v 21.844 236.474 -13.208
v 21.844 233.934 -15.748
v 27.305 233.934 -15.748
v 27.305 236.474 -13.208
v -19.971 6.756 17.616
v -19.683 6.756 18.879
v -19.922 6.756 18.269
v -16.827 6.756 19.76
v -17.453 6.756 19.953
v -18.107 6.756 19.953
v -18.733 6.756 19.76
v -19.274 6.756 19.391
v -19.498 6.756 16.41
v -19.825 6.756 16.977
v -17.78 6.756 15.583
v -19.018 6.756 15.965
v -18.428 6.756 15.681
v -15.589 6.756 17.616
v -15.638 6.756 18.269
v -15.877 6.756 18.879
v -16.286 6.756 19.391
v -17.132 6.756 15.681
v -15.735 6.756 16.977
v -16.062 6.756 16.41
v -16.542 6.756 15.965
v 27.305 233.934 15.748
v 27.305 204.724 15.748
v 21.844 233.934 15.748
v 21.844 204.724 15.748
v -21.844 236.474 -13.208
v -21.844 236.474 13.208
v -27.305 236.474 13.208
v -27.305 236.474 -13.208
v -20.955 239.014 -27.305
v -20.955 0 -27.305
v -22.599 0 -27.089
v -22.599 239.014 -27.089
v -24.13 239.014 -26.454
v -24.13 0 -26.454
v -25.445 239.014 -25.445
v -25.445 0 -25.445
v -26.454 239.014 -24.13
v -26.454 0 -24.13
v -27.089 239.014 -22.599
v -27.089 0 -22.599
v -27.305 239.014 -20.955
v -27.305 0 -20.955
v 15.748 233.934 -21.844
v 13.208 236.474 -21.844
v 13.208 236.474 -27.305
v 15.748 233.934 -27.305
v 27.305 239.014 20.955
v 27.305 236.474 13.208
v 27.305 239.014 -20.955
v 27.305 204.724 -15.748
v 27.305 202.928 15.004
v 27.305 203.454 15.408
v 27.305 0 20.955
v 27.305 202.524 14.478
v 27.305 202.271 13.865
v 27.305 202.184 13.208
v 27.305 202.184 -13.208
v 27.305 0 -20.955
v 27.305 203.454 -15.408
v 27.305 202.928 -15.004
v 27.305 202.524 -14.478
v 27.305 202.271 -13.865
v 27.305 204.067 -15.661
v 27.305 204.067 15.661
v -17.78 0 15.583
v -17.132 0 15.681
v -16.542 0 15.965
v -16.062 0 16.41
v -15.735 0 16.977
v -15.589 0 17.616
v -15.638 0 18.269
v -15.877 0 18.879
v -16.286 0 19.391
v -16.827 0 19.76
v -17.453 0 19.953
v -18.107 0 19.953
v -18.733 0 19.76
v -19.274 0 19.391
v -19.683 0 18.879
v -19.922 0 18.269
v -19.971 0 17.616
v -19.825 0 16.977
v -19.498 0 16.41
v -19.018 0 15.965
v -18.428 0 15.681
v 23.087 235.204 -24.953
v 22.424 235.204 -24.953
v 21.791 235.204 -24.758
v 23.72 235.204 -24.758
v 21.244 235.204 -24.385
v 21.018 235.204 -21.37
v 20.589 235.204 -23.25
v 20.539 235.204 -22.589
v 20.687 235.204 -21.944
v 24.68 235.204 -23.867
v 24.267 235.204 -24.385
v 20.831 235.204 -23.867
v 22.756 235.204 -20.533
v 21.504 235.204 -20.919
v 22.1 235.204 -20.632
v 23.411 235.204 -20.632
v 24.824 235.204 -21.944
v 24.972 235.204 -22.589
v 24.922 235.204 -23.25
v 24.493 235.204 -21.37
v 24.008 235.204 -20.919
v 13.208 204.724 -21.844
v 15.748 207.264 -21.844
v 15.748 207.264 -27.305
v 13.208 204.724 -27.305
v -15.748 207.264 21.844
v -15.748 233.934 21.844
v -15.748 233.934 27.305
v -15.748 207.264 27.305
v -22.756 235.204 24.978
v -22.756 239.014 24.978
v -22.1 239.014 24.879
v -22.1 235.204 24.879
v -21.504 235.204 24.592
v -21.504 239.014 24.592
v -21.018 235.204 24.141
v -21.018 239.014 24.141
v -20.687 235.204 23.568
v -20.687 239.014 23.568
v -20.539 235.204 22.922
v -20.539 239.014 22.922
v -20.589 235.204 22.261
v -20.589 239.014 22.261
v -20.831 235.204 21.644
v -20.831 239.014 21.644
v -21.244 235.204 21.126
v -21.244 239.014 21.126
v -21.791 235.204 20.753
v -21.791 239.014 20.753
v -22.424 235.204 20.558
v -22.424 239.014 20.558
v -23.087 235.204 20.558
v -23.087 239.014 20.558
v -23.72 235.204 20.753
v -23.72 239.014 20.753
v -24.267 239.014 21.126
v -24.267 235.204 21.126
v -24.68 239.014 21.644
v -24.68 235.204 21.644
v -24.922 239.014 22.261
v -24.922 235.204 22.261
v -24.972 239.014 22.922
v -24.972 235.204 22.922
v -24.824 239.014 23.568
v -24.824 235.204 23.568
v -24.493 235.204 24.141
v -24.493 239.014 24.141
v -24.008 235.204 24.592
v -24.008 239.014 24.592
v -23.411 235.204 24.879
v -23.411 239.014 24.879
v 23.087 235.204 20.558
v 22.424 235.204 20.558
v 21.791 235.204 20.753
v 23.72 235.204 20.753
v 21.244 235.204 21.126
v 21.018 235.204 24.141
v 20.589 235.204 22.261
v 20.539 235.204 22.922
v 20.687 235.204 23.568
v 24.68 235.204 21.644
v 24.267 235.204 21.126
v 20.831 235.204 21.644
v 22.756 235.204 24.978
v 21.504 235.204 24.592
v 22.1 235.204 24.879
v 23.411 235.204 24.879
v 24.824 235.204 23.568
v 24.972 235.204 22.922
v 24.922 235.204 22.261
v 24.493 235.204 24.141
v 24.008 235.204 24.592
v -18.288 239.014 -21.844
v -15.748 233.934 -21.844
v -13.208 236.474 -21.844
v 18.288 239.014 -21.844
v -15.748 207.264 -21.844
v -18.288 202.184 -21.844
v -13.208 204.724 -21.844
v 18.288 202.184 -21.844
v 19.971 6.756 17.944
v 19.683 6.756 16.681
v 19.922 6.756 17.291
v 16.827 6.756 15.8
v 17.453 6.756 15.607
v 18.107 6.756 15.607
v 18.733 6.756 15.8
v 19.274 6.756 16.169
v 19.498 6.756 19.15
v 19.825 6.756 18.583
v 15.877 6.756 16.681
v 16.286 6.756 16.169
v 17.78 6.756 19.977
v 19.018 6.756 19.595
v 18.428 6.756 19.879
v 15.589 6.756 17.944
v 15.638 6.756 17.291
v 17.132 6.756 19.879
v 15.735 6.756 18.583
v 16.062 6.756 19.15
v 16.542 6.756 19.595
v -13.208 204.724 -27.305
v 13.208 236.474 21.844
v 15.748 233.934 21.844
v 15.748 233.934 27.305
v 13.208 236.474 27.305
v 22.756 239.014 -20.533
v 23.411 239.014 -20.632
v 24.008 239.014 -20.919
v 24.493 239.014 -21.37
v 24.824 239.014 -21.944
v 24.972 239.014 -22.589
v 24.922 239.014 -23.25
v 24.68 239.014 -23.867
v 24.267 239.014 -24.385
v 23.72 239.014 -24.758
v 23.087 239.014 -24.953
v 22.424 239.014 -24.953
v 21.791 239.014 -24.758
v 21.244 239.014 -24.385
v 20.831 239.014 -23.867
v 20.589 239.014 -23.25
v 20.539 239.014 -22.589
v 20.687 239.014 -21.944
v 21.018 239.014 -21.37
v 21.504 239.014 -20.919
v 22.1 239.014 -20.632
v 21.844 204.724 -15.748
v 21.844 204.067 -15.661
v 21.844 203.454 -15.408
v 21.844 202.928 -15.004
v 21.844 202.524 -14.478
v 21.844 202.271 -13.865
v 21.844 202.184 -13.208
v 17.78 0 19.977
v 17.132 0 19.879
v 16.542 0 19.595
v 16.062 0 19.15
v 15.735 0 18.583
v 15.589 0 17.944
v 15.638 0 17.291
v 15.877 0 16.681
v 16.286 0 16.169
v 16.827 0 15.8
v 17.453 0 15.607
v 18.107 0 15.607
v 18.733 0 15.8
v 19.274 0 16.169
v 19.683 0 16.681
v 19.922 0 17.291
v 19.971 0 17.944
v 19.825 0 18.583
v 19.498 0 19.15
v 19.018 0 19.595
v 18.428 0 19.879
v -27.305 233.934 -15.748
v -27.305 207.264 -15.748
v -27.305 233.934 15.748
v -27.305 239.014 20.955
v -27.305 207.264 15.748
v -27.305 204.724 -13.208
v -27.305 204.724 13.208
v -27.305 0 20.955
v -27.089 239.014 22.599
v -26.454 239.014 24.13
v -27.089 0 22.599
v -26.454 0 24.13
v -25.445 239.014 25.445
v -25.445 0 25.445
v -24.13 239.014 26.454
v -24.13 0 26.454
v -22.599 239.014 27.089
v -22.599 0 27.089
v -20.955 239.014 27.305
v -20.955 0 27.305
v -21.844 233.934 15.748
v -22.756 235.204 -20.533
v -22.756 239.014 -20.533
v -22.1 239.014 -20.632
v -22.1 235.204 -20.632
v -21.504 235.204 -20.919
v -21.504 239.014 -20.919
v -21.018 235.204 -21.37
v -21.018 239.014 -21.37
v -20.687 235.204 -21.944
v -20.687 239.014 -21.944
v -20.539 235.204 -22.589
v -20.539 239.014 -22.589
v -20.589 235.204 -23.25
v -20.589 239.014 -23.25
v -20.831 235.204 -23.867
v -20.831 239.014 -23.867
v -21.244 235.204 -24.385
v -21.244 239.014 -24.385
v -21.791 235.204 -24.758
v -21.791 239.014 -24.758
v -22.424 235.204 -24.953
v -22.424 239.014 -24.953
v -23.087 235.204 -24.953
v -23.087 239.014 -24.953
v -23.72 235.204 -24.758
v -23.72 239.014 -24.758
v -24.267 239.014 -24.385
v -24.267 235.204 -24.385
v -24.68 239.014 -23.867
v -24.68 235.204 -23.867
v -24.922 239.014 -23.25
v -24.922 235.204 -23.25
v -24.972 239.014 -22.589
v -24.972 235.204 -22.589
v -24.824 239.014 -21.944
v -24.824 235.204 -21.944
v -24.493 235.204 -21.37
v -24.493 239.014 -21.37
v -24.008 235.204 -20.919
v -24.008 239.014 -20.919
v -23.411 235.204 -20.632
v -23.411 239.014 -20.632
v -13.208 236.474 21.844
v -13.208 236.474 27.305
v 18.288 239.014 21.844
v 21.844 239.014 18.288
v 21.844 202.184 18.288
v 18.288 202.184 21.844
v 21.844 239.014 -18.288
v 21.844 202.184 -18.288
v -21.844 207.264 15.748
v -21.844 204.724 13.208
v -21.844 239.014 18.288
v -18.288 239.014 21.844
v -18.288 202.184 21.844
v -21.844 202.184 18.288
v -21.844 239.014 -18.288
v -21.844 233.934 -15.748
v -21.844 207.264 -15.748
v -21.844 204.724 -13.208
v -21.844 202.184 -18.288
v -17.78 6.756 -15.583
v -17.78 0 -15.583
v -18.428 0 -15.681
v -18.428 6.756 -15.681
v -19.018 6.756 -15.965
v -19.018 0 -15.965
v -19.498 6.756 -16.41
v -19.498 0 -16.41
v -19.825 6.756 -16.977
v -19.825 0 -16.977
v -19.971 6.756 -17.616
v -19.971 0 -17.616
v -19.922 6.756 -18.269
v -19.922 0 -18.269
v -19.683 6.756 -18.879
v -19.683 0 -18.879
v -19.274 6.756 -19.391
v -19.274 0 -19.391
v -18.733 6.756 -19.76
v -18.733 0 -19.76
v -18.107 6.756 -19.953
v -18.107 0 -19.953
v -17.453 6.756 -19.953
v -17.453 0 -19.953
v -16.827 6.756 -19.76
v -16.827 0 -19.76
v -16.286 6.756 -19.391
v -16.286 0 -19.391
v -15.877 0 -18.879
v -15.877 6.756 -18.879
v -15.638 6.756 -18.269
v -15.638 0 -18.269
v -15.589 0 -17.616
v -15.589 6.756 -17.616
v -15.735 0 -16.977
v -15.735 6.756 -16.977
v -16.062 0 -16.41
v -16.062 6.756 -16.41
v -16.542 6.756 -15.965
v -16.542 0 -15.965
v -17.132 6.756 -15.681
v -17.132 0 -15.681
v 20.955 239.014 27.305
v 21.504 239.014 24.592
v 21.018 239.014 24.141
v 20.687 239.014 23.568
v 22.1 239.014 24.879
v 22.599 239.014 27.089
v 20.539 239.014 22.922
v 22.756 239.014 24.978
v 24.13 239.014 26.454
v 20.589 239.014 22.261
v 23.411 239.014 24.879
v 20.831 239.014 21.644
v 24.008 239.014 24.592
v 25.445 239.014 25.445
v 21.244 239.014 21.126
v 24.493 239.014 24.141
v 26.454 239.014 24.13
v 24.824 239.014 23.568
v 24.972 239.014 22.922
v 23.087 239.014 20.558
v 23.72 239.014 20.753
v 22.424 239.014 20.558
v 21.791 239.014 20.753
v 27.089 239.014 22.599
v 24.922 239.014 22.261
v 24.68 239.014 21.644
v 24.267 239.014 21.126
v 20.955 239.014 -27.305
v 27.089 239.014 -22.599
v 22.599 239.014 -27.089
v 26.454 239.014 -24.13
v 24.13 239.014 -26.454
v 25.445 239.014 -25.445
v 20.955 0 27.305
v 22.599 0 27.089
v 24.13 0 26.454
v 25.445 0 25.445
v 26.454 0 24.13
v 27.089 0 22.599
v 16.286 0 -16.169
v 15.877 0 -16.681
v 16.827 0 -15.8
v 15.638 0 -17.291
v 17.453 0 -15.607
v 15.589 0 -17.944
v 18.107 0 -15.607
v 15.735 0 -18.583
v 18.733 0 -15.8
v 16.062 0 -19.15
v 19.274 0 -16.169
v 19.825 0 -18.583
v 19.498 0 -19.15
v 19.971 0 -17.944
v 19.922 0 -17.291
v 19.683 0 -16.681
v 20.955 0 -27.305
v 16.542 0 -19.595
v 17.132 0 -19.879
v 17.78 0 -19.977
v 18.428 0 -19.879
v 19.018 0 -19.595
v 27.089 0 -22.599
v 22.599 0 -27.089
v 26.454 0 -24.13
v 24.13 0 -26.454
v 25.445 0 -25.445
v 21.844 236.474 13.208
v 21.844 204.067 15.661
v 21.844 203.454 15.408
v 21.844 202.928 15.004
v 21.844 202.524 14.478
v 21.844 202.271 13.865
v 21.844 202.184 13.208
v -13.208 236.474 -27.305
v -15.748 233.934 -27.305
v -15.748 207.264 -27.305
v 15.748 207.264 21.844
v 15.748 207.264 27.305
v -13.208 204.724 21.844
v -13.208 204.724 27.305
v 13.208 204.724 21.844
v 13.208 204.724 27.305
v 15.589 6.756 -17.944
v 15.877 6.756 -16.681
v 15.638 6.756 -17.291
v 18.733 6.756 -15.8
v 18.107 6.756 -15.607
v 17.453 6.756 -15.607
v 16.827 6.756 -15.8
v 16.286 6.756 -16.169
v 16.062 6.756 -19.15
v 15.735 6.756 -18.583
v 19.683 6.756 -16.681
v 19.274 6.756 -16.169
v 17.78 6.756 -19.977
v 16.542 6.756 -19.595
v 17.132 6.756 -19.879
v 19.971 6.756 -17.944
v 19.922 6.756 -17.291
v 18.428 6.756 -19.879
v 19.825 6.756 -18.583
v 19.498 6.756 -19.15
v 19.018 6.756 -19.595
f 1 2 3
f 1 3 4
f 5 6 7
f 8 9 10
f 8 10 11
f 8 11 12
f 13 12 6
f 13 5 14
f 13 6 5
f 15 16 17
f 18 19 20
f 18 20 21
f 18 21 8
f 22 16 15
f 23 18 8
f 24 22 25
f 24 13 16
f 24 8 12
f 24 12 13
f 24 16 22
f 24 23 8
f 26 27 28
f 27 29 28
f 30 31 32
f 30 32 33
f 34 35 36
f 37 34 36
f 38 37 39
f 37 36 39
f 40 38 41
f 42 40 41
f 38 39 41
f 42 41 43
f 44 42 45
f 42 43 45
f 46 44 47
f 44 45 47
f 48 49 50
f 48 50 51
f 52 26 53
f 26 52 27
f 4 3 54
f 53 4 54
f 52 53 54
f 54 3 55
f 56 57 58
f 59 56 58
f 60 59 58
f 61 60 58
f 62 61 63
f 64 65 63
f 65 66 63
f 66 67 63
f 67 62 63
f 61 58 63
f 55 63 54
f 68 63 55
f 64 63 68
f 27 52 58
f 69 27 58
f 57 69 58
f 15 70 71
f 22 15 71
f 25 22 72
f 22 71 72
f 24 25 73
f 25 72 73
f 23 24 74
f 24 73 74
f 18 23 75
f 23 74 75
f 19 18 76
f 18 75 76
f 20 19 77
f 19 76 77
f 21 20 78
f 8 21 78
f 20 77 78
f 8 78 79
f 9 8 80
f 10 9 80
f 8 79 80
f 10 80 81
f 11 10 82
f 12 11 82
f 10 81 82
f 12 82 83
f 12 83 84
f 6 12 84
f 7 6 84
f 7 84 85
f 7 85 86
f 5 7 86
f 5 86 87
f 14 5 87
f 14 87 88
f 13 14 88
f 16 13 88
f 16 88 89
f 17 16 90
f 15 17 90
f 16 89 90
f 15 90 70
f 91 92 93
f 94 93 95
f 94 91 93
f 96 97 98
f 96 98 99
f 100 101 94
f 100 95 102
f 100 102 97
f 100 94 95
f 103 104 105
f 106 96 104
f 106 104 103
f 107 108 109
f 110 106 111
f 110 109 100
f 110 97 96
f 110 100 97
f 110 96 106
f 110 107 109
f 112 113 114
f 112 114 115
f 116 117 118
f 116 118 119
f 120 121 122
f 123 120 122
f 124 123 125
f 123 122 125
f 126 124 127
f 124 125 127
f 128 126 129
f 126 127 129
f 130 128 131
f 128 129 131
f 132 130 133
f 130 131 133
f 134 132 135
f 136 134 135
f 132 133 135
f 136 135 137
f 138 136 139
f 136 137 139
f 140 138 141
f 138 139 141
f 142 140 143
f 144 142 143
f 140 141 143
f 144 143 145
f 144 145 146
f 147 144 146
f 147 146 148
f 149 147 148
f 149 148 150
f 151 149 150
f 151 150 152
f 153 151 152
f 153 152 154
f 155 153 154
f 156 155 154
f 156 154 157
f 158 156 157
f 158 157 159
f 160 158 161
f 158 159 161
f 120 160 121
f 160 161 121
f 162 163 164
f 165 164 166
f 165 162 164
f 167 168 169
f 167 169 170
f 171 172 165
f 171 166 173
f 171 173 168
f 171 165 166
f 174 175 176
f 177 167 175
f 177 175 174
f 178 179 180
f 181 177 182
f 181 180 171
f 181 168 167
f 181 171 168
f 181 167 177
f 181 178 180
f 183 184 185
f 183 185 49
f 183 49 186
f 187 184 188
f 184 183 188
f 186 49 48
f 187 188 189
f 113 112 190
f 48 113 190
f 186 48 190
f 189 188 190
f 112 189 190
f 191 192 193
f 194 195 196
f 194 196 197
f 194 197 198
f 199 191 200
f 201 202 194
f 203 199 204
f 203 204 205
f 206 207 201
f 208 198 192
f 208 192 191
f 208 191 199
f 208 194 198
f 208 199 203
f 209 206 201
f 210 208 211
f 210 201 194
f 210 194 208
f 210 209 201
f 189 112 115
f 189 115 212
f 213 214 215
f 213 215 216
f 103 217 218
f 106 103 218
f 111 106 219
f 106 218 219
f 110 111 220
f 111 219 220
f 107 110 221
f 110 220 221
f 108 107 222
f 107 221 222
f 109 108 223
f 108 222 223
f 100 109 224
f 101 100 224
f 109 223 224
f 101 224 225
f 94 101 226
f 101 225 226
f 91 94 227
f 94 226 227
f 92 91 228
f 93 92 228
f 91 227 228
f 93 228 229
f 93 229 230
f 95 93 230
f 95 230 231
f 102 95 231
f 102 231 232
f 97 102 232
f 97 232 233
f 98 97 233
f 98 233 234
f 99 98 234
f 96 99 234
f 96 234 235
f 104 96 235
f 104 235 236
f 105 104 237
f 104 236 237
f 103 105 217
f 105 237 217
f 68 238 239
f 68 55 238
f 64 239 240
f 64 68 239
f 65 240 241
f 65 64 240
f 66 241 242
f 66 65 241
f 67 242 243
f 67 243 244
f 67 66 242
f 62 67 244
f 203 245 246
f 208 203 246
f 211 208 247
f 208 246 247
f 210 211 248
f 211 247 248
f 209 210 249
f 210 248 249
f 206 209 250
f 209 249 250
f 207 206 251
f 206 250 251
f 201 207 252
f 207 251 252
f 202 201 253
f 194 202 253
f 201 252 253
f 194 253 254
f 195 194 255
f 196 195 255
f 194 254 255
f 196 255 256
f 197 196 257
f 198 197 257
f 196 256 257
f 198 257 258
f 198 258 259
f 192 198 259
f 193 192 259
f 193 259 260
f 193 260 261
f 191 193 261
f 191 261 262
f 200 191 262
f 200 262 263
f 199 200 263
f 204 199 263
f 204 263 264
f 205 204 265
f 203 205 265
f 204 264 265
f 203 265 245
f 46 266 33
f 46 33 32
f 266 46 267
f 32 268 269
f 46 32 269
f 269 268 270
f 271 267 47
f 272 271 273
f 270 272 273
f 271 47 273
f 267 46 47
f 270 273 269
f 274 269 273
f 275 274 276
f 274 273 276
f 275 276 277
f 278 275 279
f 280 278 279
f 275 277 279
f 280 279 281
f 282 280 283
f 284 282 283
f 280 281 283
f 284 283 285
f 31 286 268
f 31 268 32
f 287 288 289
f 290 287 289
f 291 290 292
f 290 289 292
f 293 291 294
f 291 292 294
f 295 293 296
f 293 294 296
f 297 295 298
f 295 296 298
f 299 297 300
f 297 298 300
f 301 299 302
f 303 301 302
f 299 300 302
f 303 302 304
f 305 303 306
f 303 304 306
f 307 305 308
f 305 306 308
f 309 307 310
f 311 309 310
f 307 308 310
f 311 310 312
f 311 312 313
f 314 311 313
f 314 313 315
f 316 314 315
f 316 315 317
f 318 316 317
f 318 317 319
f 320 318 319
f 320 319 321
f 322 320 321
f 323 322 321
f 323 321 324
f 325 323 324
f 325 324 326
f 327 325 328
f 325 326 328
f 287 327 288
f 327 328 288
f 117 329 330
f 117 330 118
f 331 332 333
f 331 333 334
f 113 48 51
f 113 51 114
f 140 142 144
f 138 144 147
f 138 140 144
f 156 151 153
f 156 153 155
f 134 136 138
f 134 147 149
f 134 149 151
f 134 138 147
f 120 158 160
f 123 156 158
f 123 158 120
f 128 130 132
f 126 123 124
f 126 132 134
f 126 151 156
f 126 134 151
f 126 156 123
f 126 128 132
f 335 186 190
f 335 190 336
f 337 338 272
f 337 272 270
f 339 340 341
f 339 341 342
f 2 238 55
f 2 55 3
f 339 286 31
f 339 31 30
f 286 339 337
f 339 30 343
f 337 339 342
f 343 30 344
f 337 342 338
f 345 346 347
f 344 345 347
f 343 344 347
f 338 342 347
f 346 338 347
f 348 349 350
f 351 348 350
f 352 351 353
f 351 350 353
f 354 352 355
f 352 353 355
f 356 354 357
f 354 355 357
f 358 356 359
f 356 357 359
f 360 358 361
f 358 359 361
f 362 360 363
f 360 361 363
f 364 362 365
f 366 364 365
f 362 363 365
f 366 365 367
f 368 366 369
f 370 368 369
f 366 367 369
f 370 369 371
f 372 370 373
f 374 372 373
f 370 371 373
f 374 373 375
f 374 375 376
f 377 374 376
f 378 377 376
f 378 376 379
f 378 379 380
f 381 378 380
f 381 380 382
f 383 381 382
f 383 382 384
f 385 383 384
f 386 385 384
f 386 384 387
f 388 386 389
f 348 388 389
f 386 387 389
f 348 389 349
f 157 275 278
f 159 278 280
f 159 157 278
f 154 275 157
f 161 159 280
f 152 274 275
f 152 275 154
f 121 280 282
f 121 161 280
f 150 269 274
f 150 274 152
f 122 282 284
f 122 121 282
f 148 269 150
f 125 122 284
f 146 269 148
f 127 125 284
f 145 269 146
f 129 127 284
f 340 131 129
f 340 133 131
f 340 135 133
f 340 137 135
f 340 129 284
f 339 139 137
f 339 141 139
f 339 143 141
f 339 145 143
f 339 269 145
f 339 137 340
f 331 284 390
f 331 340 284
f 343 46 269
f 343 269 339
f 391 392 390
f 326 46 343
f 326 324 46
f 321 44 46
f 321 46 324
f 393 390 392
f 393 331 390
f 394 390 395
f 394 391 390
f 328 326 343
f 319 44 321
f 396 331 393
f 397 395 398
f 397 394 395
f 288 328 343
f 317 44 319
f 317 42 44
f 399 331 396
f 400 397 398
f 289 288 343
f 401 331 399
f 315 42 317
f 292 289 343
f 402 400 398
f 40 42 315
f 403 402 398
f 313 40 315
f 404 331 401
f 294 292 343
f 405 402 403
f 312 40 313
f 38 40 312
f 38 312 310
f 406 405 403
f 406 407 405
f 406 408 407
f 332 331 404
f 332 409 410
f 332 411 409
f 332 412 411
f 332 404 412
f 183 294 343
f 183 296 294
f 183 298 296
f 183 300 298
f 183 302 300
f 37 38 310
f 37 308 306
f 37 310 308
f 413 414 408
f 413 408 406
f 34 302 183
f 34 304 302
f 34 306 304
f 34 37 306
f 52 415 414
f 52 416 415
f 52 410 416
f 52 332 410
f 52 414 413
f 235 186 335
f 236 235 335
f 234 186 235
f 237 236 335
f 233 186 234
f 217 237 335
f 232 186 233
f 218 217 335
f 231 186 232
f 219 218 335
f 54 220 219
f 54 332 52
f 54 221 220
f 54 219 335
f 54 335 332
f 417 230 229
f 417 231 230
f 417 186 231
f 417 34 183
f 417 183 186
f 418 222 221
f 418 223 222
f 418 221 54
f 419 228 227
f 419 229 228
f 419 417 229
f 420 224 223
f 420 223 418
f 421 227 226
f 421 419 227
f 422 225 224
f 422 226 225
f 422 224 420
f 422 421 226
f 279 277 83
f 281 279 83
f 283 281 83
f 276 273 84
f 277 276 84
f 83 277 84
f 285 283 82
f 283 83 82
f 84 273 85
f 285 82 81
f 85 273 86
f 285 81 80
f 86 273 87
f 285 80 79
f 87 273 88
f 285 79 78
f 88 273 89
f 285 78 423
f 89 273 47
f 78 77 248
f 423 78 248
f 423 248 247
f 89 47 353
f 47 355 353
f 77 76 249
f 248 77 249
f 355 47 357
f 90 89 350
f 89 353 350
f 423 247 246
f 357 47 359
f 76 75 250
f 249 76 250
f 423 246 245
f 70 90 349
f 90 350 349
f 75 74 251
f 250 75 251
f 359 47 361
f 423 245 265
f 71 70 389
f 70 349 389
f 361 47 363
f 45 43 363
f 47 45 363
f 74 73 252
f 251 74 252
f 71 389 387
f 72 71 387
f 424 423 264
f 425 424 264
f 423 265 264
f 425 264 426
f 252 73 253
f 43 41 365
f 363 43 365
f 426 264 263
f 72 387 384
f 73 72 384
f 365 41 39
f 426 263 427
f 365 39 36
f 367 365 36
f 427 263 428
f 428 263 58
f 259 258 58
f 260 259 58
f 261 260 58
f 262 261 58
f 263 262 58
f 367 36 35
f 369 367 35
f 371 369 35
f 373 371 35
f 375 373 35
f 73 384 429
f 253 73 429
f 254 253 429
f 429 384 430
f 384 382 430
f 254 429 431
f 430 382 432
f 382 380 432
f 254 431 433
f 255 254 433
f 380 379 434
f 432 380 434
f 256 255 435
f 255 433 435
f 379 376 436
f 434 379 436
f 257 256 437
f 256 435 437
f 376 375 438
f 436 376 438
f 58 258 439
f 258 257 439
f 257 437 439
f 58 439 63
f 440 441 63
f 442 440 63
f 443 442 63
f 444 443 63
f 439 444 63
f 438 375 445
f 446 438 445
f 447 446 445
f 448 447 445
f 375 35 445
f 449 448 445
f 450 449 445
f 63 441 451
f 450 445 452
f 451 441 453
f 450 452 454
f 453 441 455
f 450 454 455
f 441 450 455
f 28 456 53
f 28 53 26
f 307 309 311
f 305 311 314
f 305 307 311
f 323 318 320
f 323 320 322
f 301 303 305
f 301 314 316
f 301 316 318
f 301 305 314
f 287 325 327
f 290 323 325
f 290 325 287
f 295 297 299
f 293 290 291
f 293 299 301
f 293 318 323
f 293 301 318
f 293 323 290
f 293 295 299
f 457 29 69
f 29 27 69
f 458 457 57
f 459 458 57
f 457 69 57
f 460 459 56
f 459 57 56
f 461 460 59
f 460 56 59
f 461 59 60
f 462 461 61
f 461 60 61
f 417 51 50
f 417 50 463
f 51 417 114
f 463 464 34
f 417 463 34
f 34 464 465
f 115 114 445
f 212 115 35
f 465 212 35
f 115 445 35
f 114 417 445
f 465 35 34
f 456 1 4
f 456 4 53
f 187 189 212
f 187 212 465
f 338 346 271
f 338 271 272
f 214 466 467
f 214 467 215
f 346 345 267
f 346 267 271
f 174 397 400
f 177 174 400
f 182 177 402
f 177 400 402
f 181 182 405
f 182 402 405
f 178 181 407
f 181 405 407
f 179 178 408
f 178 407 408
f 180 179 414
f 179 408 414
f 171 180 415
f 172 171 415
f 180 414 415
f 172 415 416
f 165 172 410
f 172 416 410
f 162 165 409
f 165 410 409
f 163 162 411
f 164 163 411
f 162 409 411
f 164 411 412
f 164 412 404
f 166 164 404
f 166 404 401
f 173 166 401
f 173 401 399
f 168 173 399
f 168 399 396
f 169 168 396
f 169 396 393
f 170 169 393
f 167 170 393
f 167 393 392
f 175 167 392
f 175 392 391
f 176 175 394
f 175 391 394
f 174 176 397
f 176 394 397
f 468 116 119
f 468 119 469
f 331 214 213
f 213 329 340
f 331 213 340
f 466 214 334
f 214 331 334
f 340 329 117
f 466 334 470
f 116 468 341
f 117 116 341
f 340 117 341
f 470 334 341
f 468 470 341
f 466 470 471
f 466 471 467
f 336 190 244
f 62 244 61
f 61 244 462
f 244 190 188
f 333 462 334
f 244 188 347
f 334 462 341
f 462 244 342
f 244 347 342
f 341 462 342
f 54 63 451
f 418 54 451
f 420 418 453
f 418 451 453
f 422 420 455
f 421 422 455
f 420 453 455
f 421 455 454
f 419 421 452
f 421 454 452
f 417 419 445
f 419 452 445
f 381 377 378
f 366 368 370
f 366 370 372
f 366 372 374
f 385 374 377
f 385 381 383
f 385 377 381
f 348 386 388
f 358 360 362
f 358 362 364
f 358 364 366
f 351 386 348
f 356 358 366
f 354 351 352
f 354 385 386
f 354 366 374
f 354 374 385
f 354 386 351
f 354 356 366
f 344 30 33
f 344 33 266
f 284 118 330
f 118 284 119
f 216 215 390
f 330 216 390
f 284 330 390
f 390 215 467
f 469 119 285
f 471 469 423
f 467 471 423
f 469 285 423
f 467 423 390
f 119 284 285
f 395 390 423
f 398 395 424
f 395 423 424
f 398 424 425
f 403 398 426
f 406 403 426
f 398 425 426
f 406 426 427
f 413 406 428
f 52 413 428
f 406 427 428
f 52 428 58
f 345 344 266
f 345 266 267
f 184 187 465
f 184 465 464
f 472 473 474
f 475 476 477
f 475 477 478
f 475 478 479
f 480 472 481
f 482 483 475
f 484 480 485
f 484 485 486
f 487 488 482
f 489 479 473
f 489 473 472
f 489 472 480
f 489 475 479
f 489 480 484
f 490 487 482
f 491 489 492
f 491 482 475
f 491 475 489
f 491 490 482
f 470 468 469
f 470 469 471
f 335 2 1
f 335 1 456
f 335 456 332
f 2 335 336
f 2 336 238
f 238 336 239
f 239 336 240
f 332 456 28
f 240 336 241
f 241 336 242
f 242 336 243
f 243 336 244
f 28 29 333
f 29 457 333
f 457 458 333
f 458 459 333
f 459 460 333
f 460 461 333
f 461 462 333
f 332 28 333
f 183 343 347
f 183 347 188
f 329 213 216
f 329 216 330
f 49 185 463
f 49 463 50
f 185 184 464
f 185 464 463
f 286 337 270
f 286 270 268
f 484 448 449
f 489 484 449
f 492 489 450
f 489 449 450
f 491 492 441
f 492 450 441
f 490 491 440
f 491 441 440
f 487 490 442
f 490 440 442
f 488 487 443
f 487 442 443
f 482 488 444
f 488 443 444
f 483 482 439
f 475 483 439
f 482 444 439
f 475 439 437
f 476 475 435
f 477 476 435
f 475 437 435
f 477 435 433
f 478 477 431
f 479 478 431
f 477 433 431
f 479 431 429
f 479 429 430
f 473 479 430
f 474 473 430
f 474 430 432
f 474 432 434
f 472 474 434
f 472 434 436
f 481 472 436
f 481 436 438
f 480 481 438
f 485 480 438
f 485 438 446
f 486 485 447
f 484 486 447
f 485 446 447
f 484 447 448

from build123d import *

# Parameters (mm, degrees)
BOSS_EXTRUDE1_DEPTH = 202.184
SKETCH2_R           = 2.1971
CUT_EXTRUDE1_DEPTH  = 6.7564
BOSS_EXTRUDE2_DEPTH = 36.83
CUT_EXTRUDE3_DEPTH  = 5.461
CIRPATTERN1_COUNT   = 4
SKETCH5_W           = 31.496
SKETCH5_H           = 5.08
CUT_EXTRUDE4_DEPTH  = 5.461
FILLET1_R           = 2.54
SKETCH6_R           = 2.2225
CUT_EXTRUDE5_DEPTH  = 3.81


with BuildPart() as part:
    # Sketch1 → Boss-Extrude1 (new body)
    with BuildSketch(Plane(origin=(0, 0, 0), x_dir=(1, 0, 0), z_dir=(0, 1, 0))):
        with BuildLine():
            Line((-20.955, -27.305), (20.955, -27.305))
            ThreePointArc((20.955, -27.305), (25.445128061, -25.445128061), (27.305, -20.955))
            Line((27.305, -20.955), (27.305, 20.955))
            ThreePointArc((27.305, 20.955), (25.445128061, 25.445128061), (20.955, 27.305))
            Line((20.955, 27.305), (-20.955, 27.305))
            ThreePointArc((-20.955, 27.305), (-25.445128061, 25.445128061), (-27.305, 20.955))
            Line((-27.305, 20.955), (-27.305, -20.955))
            ThreePointArc((-27.305, -20.955), (-25.445128061, -25.445128061), (-20.955, -27.305))
        make_face()
    extrude(amount=BOSS_EXTRUDE1_DEPTH)

    # Sketch2 → Cut-Extrude1 (cut)
    with BuildSketch(Plane.XZ):
        with Locations(Location((-17.78, 17.78, 0), (0, 0, 270))):
            Circle(SKETCH2_R)
        with Locations(Location((17.78, 17.78, 0), (0, 0, 90))):
            Circle(SKETCH2_R)
        with Locations(Location((17.78, -17.78, 0), (0, 0, 270))):
            Circle(SKETCH2_R)
        with Locations(Location((-17.78, -17.78, 0), (0, 0, 90))):
            Circle(SKETCH2_R)
    extrude(amount=-CUT_EXTRUDE1_DEPTH, mode=Mode.SUBTRACT)

    # Sketch3 → Boss-Extrude2 (add)
    with BuildSketch(Plane(origin=(0, 202.184, 0), x_dir=(1, 0, 0), z_dir=(0, 1, 0))):
        with BuildLine():
            Line((-27.305, 20.955), (-27.305, -20.955))
            ThreePointArc((-27.305, -20.955), (-25.445128061, -25.445128061), (-20.955, -27.305))
            Line((-20.955, -27.305), (20.955, -27.305))
            ThreePointArc((20.955, -27.305), (25.445128061, -25.445128061), (27.305, -20.955))
            Line((27.305, -20.955), (27.305, 20.955))
            ThreePointArc((27.305, 20.955), (25.445128061, 25.445128061), (20.955, 27.305))
            Line((20.955, 27.305), (-20.955, 27.305))
            ThreePointArc((-20.955, 27.305), (-25.445128061, 25.445128061), (-27.305, 20.955))
        make_face()
        Polygon((21.844, -18.288), (18.288, -21.844), (-18.288, -21.844), (-21.844, -18.288), (-21.844, 18.288), (-18.288, 21.844), (18.288, 21.844), (21.844, 18.288), align=None, mode=Mode.SUBTRACT)
    extrude(amount=BOSS_EXTRUDE2_DEPTH)

    # Sketch4 → Cut-Extrude3 (cut)
    with BuildSketch(Plane.ZY.offset(-21.844)):
        Polygon((-13.208, 236.474), (13.208, 236.474), (15.748, 233.934), (15.748, 207.264), (13.208, 204.724), (-13.208, 204.724), (-15.748, 207.264), (-15.748, 233.934), align=None)
    cut_extrude3 = extrude(amount=-CUT_EXTRUDE3_DEPTH, mode=Mode.SUBTRACT)

    # CirPattern1: Cut-Extrude3 ×4 about axis
    cirpattern1_axis = Axis((0, 0, 0), (0, 1, 0))
    for i in range(1, CIRPATTERN1_COUNT):
        add(cut_extrude3.rotate(cirpattern1_axis, i * 360 / CIRPATTERN1_COUNT), mode=Mode.SUBTRACT)

    # Sketch5 → Cut-Extrude4 (cut)
    with BuildSketch(Plane.ZY.offset(-21.844)):
        with Locations((0, 204.724)):
            Rectangle(SKETCH5_W, SKETCH5_H)
    extrude(amount=-CUT_EXTRUDE4_DEPTH, mode=Mode.SUBTRACT)

    # Fillet1
    fillet1_edges = [part.edges().sort_by_distance(p)[0] for p in [
        (24.5745, 202.184, 15.748),
        (24.5745, 202.184, -15.748),
    ]]
    fillet(fillet1_edges, radius=FILLET1_R)

    # Sketch6 → Cut-Extrude5 (cut)
    with BuildSketch(Plane(origin=(0, 239.014, 0), x_dir=(1, 0, 0), z_dir=(0, 1, 0))):
        with Locations(Location((22.75556403, -22.75556403, 0), (0, 0, 270))):
            Circle(SKETCH6_R)
        with Locations(Location((-22.75556403, -22.75556403, 0), (0, 0, 270))):
            Circle(SKETCH6_R)
        with Locations(Location((-22.75556403, 22.75556403, 0), (0, 0, 270))):
            Circle(SKETCH6_R)
        with Locations(Location((22.75556403, 22.75556403, 0), (0, 0, 270))):
            Circle(SKETCH6_R)
    extrude(amount=-CUT_EXTRUDE5_DEPTH, mode=Mode.SUBTRACT)


solid = part.part
